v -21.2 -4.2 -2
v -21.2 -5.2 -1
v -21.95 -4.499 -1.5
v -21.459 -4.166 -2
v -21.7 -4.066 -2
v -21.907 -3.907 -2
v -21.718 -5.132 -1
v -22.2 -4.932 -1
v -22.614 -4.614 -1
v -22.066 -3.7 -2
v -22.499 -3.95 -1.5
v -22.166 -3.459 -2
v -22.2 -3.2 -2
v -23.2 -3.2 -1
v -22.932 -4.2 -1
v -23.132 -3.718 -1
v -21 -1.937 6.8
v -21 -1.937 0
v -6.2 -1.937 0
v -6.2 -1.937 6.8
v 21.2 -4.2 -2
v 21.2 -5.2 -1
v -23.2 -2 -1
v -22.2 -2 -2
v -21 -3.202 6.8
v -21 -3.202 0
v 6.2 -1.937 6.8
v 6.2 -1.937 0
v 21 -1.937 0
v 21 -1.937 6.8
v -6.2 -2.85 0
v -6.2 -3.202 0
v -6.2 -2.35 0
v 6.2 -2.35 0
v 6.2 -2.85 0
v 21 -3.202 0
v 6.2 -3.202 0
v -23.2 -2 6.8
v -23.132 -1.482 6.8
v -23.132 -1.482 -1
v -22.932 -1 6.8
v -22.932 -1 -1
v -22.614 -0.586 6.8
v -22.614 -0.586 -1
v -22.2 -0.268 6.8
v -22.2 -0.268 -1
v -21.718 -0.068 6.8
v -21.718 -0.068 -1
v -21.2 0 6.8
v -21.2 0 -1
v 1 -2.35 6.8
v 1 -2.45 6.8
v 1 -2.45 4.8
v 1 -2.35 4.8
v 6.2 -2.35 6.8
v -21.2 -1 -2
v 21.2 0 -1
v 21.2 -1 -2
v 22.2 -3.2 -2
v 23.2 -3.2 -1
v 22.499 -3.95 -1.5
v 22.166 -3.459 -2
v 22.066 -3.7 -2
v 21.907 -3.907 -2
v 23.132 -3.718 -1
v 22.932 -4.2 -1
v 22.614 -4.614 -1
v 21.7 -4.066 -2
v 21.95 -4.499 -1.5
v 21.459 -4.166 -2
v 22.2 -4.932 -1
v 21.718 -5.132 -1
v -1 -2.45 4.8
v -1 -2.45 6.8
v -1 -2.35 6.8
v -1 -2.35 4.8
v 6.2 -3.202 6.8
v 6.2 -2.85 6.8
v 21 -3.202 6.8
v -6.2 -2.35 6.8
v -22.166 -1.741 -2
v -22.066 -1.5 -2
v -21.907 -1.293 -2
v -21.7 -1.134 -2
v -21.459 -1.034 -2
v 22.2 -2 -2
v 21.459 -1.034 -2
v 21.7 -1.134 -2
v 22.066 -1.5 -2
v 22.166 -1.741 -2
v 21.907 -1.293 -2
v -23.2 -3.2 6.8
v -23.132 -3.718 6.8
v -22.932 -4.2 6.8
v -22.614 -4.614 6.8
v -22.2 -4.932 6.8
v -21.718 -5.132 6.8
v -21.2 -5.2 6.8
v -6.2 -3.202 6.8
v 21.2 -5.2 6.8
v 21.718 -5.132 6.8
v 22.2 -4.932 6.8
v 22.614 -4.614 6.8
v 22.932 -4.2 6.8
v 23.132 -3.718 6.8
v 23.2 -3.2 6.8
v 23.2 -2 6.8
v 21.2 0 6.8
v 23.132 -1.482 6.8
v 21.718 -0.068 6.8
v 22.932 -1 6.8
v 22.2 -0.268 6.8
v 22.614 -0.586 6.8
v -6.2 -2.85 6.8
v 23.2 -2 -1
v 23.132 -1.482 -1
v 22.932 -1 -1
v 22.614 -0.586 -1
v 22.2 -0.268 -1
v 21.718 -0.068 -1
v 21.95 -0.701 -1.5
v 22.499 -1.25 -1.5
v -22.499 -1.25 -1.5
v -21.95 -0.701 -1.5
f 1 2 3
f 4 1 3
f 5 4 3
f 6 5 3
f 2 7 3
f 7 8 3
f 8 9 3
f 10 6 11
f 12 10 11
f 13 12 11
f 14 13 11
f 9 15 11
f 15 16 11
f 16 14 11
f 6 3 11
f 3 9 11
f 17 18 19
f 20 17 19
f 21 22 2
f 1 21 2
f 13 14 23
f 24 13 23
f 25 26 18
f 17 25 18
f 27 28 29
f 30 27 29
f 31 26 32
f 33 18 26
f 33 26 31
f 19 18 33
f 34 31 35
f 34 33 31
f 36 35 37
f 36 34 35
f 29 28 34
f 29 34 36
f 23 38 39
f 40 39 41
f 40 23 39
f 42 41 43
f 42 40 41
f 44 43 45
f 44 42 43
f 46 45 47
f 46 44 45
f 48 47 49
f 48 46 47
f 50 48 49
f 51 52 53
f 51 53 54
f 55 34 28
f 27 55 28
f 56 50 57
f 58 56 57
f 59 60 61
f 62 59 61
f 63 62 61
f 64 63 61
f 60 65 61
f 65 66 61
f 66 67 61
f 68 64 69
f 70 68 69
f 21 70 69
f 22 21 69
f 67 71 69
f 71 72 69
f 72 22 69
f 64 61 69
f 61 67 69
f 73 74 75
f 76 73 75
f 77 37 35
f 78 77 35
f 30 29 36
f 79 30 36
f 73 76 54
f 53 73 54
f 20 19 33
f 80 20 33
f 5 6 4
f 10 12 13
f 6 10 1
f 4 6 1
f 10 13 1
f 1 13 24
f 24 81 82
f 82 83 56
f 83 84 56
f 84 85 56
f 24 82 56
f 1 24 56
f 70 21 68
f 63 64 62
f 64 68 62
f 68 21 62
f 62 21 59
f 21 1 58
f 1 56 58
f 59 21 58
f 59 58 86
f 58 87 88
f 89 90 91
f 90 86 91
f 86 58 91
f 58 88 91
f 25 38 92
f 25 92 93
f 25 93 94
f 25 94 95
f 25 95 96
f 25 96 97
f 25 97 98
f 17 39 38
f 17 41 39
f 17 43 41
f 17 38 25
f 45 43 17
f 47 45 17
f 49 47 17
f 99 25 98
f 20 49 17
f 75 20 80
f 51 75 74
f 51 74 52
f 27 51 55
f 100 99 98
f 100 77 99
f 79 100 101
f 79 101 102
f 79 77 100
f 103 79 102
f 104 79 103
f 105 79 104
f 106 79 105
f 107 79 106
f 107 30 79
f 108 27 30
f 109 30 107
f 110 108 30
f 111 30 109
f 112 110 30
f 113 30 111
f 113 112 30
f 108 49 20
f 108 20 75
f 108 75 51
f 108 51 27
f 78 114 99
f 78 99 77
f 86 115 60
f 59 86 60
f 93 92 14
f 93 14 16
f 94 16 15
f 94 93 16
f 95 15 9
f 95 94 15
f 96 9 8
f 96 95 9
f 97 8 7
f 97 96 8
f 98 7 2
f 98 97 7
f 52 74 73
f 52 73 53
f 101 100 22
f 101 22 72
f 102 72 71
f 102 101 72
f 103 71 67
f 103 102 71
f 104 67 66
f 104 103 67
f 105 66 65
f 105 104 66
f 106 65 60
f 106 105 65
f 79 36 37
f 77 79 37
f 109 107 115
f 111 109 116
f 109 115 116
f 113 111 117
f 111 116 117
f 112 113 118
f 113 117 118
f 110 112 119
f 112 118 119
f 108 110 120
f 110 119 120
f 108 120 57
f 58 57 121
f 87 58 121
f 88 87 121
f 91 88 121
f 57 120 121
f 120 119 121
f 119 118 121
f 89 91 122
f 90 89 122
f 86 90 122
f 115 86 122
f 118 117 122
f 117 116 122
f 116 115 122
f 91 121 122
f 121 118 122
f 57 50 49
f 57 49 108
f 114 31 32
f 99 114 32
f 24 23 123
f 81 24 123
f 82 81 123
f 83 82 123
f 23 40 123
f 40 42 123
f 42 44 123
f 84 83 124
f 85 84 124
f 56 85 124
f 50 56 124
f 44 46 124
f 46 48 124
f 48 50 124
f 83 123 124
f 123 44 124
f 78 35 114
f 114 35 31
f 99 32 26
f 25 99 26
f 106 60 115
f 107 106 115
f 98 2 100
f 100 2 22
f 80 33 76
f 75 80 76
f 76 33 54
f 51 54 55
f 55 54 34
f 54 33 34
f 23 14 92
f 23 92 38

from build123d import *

# Parameters (mm, degrees)
F0_W     = 46.4
F0_H     = 5.2
F0_W_2   = 14.8002340496
F0_H_2   = 0.4131594501
F0_H_3   = 0.3522689282
F1_DEPTH = 2
F2_DEPTH = 6.8
F3_R     = 2
F4_SIZE  = 1
F5_W     = 2
F5_H     = 0.1
F6_DEPTH = 2


with BuildPart() as f1:
    # F0 (on Top) → F1 (new body)
    with BuildSketch(Plane.XY):
        with Locations((0, -2.6)):
            Rectangle(F0_W, F0_H)
        Polygon((-21, -2.85), (-21, -2.35), (-21, -1.9368405499), (-6.1997659504, -1.9368405499), (-6.1997659504, -2.35), (0, -2.35), (6.1997659504, -2.35), (6.1997659504, -1.9368405499), (21, -1.9368405499), (21, -2.35), (21, -2.85), (21, -3.2022689282), (6.1997659504, -3.2022689282), (6.1997659504, -2.85), (0, -2.85), (-6.1997659504, -2.85), (-6.1997659504, -3.2022689282), (-21, -3.2022689282), align=None, mode=Mode.SUBTRACT)
        Polygon((-6.1997659504, -2.35), (-21, -2.35), (-21, -2.85), (-6.1997659504, -2.85), (0, -2.85), (6.1997659504, -2.85), (21, -2.85), (21, -2.35), (6.1997659504, -2.35), (0, -2.35), align=None)
        with Locations((-13.5998829752, -2.143420275)):
            Rectangle(F0_W_2, F0_H_2)
        with Locations((13.5998829752, -2.143420275)):
            Rectangle(F0_W_2, F0_H_2)
        with Locations((-13.5998829752, -3.0261344641)):
            Rectangle(F0_W_2, F0_H_3)
        with Locations((13.5998829752, -3.0261344641)):
            Rectangle(F0_W_2, F0_H_3)
    extrude(amount=-F1_DEPTH)

    # F0 (on Top) → F2 (join)
    with BuildSketch(Plane.XY):
        with Locations((0, -2.6)):
            Rectangle(F0_W, F0_H)
        Polygon((-21, -2.85), (-21, -2.35), (-21, -1.9368405499), (-6.1997659504, -1.9368405499), (-6.1997659504, -2.35), (0, -2.35), (6.1997659504, -2.35), (6.1997659504, -1.9368405499), (21, -1.9368405499), (21, -2.35), (21, -2.85), (21, -3.2022689282), (6.1997659504, -3.2022689282), (6.1997659504, -2.85), (0, -2.85), (-6.1997659504, -2.85), (-6.1997659504, -3.2022689282), (-21, -3.2022689282), align=None, mode=Mode.SUBTRACT)
    extrude(amount=F2_DEPTH)

    # F3
    f3_edges = [f1.edges().sort_by_distance(p)[0] for p in [
        (23.2, -5.2, 2.4),
        (23.2, 0, 2.4),
        (-23.2, -5.2, 2.4),
        (-23.2, 0, 2.4),
    ]]
    fillet(f3_edges, radius=F3_R)

    # F4
    f4_edges = [f1.edges().sort_by_distance(p)[0] for p in [
        (0, 0, -2),
        (22.614214, -0.585786, -2),
        (-22.614214, -0.585786, -2),
        (23.2, -2.6, -2),
        (-23.2, -2.6, -2),
        (22.614214, -4.614214, -2),
        (-22.614214, -4.614214, -2),
        (0, -5.2, -2),
    ]]
    chamfer(f4_edges, length=F4_SIZE)

    # F5 (on face) → F6 (join)
    with BuildSketch(Plane.XY.offset(6.8)):
        with Locations((0, -2.4)):
            Rectangle(F5_W, F5_H)
    extrude(amount=-F6_DEPTH)


solid = f1.part
